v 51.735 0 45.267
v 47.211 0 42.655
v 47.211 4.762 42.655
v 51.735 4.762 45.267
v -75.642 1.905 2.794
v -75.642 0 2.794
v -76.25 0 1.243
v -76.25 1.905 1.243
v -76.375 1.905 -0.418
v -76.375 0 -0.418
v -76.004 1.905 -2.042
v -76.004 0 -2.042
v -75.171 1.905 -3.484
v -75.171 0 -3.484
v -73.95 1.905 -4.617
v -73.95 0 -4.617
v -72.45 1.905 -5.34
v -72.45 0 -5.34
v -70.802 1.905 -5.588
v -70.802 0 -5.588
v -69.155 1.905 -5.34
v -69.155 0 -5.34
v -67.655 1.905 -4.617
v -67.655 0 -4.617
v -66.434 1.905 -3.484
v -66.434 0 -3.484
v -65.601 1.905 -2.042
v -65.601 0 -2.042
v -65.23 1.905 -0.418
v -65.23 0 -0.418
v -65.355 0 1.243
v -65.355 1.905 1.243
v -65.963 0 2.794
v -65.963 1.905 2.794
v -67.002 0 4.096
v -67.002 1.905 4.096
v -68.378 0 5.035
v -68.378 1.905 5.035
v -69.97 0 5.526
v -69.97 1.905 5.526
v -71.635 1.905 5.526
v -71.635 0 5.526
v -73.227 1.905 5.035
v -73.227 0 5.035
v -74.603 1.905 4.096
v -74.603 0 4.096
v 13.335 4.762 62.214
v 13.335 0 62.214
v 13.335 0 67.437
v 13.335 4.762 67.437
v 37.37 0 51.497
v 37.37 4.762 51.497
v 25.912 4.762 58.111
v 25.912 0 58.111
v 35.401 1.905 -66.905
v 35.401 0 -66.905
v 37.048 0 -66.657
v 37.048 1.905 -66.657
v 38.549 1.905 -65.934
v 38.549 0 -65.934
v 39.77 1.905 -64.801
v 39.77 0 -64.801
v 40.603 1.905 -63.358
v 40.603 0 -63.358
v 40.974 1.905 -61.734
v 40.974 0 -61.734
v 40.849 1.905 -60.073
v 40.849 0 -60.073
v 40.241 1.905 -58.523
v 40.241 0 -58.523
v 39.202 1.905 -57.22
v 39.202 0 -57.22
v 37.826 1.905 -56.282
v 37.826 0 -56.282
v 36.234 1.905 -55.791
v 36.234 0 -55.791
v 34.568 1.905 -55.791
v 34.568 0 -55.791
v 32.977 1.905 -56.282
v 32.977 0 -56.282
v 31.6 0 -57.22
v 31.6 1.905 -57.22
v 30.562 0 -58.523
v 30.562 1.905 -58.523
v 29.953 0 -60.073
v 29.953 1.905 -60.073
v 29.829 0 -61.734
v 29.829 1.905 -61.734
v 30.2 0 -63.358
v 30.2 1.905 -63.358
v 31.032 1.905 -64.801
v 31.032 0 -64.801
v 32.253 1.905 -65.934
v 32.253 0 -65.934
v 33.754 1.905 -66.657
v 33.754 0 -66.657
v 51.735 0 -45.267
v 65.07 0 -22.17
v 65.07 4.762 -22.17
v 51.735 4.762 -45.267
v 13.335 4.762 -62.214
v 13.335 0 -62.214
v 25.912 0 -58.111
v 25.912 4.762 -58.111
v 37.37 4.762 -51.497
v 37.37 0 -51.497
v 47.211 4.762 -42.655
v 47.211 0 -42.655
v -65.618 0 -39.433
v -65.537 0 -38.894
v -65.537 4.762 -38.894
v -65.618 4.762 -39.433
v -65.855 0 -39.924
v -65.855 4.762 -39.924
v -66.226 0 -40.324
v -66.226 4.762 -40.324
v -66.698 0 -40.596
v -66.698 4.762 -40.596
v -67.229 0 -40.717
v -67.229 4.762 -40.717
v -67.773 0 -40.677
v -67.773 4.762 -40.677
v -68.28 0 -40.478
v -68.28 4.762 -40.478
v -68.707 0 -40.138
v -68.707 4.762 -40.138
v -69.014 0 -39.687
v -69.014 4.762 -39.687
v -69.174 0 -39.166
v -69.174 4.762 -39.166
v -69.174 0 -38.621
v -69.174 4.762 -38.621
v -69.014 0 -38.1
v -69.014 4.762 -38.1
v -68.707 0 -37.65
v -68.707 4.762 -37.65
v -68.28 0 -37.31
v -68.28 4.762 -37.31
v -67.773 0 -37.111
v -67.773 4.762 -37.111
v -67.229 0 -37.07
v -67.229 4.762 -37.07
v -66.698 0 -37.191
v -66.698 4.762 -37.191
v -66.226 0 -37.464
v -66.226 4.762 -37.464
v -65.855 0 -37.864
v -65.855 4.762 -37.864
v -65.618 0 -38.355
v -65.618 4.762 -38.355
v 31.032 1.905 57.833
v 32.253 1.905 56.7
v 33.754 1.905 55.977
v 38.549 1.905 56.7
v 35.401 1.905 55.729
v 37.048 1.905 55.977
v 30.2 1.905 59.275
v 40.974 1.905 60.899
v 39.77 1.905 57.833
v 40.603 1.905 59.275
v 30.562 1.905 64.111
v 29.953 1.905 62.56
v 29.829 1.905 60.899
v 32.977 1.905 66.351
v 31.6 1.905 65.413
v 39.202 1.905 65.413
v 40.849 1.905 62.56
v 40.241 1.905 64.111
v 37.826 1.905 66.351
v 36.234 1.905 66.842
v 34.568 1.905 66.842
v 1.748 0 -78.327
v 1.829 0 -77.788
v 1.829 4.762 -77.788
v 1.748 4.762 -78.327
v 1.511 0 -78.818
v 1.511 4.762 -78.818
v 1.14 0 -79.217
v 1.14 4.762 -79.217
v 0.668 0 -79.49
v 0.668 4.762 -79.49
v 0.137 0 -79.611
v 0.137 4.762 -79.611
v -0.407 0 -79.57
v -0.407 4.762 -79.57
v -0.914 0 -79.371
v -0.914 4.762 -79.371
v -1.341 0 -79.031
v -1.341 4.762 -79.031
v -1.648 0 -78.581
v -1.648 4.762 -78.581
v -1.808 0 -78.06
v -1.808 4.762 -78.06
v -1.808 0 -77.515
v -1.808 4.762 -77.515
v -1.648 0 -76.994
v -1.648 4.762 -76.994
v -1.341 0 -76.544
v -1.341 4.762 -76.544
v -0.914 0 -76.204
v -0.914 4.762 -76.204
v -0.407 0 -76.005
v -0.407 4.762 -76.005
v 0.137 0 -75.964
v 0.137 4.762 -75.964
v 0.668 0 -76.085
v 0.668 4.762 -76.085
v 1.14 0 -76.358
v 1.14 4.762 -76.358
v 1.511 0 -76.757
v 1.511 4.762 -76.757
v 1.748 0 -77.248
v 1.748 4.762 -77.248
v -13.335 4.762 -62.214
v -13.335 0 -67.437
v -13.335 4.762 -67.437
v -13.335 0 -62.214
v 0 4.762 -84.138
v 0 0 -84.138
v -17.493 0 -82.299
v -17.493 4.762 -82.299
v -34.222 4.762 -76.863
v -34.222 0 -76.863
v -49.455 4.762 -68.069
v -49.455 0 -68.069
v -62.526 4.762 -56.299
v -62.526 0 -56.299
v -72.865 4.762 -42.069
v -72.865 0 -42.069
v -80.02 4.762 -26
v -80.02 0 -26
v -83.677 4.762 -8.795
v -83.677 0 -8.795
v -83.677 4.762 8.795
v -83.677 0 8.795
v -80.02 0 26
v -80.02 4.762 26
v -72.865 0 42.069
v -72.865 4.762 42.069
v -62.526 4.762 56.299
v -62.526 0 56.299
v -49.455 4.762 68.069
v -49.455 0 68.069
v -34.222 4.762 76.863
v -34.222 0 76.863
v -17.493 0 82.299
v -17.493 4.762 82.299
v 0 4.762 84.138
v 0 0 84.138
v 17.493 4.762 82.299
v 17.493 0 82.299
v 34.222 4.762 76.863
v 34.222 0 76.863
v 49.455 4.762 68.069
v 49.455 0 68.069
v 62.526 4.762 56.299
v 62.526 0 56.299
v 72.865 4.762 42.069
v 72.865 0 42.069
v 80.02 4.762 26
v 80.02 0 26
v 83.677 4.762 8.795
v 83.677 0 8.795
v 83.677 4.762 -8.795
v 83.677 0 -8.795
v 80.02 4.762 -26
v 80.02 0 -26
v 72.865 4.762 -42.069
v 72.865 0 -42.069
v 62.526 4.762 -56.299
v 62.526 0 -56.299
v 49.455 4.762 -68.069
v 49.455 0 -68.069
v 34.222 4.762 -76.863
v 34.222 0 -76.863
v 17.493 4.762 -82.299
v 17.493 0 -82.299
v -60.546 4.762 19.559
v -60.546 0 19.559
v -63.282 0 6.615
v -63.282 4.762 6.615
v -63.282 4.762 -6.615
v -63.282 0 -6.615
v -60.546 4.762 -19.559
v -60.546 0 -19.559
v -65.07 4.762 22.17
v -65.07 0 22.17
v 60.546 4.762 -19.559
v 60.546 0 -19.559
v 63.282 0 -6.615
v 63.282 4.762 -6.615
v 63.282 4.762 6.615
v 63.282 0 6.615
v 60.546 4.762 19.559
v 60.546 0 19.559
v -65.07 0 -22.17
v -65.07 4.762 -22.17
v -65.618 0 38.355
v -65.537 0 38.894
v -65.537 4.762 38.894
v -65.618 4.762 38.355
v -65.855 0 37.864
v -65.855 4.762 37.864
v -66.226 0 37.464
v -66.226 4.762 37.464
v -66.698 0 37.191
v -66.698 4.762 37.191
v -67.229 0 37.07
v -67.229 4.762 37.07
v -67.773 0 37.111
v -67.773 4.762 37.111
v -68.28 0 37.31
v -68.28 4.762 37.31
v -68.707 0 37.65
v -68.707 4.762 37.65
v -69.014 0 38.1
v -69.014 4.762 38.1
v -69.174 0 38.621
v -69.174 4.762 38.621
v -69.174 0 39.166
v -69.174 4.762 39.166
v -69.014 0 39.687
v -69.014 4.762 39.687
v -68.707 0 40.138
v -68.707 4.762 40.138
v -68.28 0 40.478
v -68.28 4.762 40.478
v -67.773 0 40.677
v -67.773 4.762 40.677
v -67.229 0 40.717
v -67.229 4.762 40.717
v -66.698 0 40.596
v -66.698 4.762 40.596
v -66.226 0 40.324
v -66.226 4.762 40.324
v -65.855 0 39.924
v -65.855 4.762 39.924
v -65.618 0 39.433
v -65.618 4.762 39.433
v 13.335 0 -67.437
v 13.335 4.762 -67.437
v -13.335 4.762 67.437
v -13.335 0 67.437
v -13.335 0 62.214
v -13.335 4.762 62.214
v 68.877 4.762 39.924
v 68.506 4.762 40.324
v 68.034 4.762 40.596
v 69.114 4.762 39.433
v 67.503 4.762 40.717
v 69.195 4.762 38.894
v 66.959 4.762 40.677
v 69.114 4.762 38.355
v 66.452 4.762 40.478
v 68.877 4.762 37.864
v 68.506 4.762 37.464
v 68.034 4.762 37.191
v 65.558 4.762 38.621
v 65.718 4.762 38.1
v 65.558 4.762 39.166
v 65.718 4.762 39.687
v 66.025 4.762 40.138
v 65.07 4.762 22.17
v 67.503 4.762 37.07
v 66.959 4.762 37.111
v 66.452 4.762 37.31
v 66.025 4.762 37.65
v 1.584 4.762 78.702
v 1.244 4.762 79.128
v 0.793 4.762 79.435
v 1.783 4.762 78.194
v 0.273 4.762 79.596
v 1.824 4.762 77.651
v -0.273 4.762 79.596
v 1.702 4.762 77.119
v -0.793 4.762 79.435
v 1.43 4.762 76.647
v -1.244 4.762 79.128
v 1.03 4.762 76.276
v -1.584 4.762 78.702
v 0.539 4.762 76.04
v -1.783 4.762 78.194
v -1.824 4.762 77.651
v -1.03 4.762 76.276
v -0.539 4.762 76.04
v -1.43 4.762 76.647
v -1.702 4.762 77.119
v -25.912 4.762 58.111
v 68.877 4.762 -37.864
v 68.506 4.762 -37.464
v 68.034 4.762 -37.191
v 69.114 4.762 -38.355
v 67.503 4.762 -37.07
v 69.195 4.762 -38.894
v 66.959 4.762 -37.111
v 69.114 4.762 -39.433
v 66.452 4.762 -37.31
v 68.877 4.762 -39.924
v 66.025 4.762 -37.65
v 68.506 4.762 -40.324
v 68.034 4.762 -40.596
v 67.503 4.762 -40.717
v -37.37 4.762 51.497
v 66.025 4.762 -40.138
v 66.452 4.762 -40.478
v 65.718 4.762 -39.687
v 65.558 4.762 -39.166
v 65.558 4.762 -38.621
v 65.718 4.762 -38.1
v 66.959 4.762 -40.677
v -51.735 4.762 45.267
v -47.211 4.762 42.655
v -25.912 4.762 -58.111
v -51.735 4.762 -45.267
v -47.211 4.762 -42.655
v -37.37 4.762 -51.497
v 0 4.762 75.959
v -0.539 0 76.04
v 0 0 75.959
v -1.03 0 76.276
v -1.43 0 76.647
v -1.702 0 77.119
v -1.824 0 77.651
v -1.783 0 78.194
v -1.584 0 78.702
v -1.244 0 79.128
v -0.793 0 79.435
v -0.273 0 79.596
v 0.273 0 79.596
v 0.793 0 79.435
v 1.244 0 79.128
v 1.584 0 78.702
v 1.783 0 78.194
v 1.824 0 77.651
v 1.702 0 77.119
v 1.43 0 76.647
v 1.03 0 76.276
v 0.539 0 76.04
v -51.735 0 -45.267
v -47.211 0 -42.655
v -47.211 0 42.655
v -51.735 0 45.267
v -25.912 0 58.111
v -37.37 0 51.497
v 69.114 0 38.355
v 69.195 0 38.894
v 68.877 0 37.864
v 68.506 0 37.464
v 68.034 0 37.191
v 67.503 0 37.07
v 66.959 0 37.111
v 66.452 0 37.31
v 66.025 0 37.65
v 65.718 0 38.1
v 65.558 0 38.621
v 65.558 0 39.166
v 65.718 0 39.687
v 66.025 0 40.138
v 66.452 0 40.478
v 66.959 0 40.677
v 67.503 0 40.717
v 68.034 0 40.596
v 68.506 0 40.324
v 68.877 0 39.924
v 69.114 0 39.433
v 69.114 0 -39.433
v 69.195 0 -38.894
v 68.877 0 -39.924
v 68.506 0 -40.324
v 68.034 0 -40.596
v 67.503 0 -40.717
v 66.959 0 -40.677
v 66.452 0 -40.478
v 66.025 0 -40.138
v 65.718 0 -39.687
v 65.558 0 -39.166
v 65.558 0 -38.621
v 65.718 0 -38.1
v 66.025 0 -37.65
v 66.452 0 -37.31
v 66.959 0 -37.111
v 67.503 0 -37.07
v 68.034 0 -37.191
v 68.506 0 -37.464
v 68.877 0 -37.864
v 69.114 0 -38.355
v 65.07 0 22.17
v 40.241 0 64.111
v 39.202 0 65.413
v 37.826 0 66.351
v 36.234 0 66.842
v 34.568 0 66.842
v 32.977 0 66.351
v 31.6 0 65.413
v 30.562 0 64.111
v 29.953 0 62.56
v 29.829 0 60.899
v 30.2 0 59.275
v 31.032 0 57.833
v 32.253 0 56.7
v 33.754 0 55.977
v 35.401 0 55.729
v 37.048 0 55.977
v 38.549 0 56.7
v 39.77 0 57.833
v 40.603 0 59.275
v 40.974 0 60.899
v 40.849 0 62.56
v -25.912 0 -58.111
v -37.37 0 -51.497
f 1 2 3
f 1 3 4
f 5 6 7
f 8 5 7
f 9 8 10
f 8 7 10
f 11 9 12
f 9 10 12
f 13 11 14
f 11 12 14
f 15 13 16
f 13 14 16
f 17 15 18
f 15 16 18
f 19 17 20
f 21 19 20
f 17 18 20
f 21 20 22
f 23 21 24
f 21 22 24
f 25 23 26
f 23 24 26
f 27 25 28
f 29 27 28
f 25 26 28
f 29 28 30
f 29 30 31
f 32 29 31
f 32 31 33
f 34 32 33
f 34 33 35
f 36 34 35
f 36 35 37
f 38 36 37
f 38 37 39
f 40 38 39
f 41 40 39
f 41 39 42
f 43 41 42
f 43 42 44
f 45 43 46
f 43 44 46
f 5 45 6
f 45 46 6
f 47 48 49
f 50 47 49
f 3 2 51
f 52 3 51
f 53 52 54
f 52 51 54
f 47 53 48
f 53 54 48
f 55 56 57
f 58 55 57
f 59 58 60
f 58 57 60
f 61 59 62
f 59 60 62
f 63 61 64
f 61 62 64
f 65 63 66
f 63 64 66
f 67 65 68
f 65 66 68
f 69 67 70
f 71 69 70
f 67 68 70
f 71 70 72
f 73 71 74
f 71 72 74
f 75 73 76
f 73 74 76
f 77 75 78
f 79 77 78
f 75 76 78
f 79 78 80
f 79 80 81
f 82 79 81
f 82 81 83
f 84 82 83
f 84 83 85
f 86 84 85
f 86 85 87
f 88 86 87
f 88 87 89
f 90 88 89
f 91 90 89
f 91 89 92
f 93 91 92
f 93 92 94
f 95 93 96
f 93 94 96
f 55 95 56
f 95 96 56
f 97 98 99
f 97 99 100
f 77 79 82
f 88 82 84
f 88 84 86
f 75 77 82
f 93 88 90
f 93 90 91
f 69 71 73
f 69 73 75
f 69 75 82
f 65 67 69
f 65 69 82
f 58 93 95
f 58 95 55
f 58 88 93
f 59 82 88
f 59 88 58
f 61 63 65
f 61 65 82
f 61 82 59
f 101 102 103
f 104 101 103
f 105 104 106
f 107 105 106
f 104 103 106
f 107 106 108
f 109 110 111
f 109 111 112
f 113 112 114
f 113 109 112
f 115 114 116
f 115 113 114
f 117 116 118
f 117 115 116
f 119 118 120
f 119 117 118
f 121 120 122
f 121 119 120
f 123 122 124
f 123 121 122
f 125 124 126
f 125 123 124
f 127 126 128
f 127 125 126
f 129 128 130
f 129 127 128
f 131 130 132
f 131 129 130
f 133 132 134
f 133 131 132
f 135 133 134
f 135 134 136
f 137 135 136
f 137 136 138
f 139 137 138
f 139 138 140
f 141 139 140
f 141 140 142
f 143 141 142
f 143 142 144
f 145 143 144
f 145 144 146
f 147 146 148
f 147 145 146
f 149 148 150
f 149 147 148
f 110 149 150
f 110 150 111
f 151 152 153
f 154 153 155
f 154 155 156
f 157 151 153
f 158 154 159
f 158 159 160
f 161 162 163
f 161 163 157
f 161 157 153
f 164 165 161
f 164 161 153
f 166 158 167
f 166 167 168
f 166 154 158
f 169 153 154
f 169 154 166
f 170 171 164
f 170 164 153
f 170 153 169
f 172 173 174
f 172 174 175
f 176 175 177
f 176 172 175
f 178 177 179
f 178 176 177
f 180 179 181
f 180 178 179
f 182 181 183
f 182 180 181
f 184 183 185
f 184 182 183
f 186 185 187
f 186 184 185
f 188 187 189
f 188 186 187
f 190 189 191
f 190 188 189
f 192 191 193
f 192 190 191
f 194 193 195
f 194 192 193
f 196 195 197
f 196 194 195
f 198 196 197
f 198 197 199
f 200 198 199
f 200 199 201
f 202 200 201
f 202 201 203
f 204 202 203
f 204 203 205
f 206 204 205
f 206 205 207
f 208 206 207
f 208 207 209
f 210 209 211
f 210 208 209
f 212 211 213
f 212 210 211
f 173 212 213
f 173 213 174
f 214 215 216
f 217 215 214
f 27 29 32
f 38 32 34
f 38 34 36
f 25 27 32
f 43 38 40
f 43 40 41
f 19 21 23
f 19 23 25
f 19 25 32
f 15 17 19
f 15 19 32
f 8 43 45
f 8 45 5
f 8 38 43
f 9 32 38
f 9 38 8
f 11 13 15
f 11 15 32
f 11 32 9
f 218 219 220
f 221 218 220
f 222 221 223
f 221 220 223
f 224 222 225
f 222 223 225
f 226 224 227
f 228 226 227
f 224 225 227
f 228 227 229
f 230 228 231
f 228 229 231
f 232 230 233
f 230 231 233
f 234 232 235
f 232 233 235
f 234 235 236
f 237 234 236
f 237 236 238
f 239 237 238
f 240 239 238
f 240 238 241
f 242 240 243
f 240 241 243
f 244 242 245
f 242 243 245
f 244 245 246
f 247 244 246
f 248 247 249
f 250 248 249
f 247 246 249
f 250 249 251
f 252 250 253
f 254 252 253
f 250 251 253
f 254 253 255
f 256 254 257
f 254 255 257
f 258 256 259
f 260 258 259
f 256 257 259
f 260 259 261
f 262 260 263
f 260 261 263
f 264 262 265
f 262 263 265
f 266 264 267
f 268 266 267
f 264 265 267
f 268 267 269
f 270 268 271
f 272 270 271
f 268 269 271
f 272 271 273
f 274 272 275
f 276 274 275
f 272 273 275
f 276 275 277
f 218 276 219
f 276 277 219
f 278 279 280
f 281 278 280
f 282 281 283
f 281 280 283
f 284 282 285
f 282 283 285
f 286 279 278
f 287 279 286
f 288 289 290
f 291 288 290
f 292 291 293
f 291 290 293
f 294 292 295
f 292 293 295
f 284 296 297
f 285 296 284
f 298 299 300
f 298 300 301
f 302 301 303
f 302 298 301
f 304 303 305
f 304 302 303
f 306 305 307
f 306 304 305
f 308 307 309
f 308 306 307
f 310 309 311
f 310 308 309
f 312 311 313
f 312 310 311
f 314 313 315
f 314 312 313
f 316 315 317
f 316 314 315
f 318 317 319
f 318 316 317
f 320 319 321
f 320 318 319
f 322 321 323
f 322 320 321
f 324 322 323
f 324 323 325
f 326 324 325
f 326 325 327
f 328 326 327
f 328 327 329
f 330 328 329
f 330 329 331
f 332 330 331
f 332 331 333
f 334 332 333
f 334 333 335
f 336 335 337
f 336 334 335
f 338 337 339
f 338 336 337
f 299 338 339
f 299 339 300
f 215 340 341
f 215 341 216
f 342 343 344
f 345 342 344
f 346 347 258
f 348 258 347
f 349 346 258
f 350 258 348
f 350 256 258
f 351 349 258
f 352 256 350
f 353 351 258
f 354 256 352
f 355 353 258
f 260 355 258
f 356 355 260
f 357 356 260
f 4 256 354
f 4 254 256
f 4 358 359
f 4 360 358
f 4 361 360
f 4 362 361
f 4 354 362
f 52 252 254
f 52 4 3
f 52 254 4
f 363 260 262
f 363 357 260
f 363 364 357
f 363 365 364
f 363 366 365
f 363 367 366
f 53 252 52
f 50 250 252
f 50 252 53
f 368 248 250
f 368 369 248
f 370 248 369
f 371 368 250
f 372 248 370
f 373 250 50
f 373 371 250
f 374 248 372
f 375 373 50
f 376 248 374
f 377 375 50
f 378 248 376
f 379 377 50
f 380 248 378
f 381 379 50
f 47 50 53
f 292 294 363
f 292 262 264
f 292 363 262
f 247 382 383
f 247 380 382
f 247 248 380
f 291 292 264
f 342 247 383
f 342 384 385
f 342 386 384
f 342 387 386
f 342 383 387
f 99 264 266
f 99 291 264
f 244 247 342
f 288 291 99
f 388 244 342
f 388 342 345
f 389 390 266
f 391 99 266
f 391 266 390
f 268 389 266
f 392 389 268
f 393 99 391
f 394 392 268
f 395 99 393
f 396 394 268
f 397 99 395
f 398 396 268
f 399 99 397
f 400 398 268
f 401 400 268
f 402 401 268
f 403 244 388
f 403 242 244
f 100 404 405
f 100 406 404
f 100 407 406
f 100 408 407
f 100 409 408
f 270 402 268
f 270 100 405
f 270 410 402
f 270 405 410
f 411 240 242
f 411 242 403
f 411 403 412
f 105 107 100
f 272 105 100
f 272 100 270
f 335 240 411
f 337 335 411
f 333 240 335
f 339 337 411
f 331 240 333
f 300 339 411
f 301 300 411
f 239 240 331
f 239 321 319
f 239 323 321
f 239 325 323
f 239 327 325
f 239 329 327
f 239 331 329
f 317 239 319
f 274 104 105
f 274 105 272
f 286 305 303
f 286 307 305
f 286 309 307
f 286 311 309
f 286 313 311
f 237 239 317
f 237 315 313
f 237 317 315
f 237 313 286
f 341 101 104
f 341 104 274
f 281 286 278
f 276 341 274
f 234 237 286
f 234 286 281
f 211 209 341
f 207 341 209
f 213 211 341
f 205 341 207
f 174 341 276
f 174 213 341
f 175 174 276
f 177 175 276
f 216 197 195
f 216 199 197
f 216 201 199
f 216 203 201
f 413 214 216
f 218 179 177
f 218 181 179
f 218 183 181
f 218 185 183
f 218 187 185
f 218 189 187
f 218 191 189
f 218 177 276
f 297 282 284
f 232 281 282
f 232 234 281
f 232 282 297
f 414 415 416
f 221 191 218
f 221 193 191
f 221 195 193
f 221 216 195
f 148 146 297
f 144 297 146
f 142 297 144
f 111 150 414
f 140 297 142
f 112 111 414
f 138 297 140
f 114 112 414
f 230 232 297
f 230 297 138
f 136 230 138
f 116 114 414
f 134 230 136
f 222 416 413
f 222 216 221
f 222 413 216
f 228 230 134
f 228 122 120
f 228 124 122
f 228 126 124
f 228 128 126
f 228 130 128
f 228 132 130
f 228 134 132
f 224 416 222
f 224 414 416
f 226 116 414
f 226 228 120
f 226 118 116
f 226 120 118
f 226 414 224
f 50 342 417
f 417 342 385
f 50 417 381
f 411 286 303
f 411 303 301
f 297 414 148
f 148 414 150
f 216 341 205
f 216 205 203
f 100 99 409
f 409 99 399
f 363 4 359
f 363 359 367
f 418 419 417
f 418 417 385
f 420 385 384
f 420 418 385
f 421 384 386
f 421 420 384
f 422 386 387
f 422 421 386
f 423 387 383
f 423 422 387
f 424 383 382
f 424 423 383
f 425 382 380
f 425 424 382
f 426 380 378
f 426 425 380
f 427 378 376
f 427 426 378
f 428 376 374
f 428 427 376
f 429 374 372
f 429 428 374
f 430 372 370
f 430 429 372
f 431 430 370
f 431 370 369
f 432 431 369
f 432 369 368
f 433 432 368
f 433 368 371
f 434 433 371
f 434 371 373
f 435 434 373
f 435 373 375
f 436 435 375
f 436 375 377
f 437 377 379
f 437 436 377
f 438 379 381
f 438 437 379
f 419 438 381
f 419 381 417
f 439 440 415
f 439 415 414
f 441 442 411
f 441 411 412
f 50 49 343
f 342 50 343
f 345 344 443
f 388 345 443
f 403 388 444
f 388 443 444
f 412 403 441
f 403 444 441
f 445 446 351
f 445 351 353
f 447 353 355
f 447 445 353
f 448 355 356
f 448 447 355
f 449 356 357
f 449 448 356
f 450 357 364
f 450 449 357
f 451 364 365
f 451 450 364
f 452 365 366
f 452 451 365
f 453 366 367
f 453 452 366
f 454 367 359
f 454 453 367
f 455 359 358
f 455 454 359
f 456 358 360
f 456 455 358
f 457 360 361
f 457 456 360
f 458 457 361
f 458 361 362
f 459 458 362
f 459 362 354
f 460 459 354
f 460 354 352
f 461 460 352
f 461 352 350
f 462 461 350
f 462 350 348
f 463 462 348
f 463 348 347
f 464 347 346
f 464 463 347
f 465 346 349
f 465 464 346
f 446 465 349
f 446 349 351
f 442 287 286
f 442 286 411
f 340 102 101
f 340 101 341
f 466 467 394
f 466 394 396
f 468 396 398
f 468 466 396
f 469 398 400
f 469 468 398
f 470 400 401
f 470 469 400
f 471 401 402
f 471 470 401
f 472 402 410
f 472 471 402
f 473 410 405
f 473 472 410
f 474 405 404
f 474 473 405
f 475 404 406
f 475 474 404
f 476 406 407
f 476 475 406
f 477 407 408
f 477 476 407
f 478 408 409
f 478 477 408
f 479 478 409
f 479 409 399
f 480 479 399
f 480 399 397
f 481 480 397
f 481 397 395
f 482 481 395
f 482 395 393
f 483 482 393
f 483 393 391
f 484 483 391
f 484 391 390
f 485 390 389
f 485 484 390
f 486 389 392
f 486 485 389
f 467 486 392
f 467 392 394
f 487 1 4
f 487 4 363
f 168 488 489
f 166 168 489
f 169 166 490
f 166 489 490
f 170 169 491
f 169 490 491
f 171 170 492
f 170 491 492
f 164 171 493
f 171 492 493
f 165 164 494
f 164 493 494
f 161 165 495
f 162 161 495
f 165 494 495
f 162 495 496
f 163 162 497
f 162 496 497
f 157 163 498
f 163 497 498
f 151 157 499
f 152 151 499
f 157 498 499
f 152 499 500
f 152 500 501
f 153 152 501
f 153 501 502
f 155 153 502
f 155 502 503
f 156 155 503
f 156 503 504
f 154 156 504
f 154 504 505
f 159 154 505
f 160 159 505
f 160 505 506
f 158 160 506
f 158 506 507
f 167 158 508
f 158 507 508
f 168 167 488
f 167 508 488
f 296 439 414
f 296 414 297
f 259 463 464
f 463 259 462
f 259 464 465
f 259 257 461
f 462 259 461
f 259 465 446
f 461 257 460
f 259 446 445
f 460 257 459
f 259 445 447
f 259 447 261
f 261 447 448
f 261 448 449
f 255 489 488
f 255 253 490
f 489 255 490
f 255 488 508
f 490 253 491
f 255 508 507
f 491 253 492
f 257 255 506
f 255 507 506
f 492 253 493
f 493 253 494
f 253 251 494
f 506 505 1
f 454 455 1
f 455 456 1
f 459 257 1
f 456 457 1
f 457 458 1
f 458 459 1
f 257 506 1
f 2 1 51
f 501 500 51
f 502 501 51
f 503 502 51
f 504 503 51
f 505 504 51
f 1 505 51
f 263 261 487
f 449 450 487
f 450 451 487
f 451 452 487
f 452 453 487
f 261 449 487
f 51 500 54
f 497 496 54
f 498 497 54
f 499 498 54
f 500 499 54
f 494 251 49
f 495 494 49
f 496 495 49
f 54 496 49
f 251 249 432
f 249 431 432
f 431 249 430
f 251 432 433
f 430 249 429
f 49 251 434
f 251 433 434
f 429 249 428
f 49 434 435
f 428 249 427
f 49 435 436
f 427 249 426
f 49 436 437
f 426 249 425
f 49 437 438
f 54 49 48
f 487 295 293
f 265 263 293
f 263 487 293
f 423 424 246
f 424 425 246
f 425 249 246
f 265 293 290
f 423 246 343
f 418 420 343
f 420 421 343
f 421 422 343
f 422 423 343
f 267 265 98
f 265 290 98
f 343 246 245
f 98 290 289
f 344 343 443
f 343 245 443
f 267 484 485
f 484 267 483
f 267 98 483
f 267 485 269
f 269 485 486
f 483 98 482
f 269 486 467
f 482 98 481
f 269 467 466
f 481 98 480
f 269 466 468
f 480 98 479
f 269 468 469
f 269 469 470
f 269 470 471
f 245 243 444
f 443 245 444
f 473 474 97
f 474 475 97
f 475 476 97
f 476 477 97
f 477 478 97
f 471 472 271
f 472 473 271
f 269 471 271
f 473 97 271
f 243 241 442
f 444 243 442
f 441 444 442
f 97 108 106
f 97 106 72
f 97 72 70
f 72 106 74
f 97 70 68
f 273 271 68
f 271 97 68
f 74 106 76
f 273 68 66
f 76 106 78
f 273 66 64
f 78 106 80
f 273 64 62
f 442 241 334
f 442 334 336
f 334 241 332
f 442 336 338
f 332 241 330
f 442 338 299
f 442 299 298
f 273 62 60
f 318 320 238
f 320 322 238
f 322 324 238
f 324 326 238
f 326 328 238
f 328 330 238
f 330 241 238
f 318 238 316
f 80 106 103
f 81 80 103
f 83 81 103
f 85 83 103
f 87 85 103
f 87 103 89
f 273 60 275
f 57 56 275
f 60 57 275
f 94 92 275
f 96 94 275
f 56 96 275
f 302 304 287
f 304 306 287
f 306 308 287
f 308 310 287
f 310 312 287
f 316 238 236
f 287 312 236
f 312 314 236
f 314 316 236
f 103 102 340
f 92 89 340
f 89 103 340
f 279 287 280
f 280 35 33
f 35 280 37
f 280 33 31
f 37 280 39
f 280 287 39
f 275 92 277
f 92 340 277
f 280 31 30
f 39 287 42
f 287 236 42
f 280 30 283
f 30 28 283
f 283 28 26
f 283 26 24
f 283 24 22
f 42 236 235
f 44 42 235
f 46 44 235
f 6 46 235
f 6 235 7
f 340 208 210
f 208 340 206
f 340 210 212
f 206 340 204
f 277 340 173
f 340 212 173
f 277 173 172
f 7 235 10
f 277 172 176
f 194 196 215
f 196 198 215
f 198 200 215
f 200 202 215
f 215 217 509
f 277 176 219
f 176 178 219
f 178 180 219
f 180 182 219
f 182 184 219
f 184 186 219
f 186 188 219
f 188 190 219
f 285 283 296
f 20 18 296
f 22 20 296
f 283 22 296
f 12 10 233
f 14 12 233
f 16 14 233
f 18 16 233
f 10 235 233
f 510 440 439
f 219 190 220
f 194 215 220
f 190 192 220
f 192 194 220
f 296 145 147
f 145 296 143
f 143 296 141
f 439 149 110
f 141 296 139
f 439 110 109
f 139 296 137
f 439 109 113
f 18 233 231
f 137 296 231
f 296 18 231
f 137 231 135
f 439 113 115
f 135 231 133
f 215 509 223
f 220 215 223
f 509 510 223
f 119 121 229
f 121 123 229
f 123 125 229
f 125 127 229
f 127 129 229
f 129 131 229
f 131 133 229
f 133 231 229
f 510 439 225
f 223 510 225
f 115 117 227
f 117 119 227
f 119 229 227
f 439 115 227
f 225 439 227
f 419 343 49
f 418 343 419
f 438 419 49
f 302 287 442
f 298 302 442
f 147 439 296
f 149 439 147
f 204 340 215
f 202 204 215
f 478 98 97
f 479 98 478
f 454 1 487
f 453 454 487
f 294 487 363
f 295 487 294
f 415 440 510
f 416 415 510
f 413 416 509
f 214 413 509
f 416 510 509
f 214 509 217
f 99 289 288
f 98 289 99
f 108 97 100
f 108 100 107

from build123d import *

# Parameters (mm, degrees)
SKETCH1_R             = 84.1375
SKETCH1_R_2           = 1.8288
BOSS_EXTRUDE1_DEPTH   = 4.7625
CIRPATTERN1_OUTLINE_R = 1.8288
CIRPATTERN1_DEPTH     = 4.7625
SKETCH4_R             = 5.588
CUT_EXTRUDE1_DEPTH    = 1.905
CIRPATTERN2_COUNT     = 3


# Read off the part's stored shape, not the designer's step: CirPattern1
with BuildPart() as part:
    # Sketch1 → Boss-Extrude1 (new body)
    with BuildSketch(Plane(origin=(0, 0, 0), x_dir=(1, 0, 0), z_dir=(0, 1, 0))):
        with Locations(Location((0, 0, 0), (0, 0, 90))):
            Circle(SKETCH1_R)
        with BuildLine():
            ThreePointArc((-13.335, -62.213928537), (0, 63.627), (13.335, -62.213928537))
            Line((13.335, -62.213928537), (13.335, -67.437))
            Line((13.335, -67.437), (-13.335, -67.437))
            Line((-13.335, -67.437), (-13.335, -62.213928537))
        make_face(mode=Mode.SUBTRACT)
        with Locations(Location((0, -77.7875, 0), (0, 0, 90))):
            Circle(SKETCH1_R_2, mode=Mode.SUBTRACT)
    extrude(amount=BOSS_EXTRUDE1_DEPTH)

    # CirPattern1 outline → CirPattern1 (cut)
    with BuildSketch(Plane(origin=(0, 0, 0), x_dir=(1, 0, 0), z_dir=(0, 1, 0))):
        with BuildLine():
            Line((65.069655155, -22.170051241), (60.546342582, -19.558515509))
            ThreePointArc((60.546342582, -19.558515509), (55.102598367, -31.8135), (47.211342582, -42.655413028))
            Line((47.211342582, -42.655413028), (51.734655155, -45.266948759))
            Line((51.734655155, -45.266948759), (65.069655155, -22.170051241))
        make_face()
        with BuildLine():
            Line((51.734655155, 45.266948759), (47.211342582, 42.655413028))
            ThreePointArc((47.211342582, 42.655413028), (55.102598367, 31.8135), (60.546342582, 19.558515509))
            Line((60.546342582, 19.558515509), (65.069655155, 22.170051241))
            Line((65.069655155, 22.170051241), (51.734655155, 45.266948759))
        make_face()
        with BuildLine():
            Line((-13.335, 67.437), (-13.335, 62.213928537))
            ThreePointArc((-13.335, 62.213928537), (0, 63.627), (13.335, 62.213928537))
            Line((13.335, 62.213928537), (13.335, 67.437))
            Line((13.335, 67.437), (-13.335, 67.437))
        make_face()
        with BuildLine():
            Line((-65.069655155, 22.170051241), (-60.546342582, 19.558515509))
            ThreePointArc((-60.546342582, 19.558515509), (-55.102598367, 31.8135), (-47.211342582, 42.655413028))
            Line((-47.211342582, 42.655413028), (-51.734655155, 45.266948759))
            Line((-51.734655155, 45.266948759), (-65.069655155, 22.170051241))
        make_face()
        with BuildLine():
            Line((-65.069655155, -22.170051241), (-51.734655155, -45.266948759))
            Line((-51.734655155, -45.266948759), (-47.211342582, -42.655413028))
            ThreePointArc((-47.211342582, -42.655413028), (-55.102598367, -31.8135), (-60.546342582, -19.558515509))
            Line((-60.546342582, -19.558515509), (-65.069655155, -22.170051241))
        make_face()
        with Locations((-67.365951097, -38.89375)):
            Circle(CIRPATTERN1_OUTLINE_R)
        with Locations((-67.365951097, 38.89375)):
            Circle(CIRPATTERN1_OUTLINE_R)
        with Locations((0, 77.7875)):
            Circle(CIRPATTERN1_OUTLINE_R)
        with Locations((67.365951097, 38.89375)):
            Circle(CIRPATTERN1_OUTLINE_R)
        with Locations((67.365951097, -38.89375)):
            Circle(CIRPATTERN1_OUTLINE_R)
    extrude(amount=CIRPATTERN1_DEPTH, mode=Mode.SUBTRACT)

    # Sketch4 → Cut-Extrude1 (cut)
    with BuildSketch(Plane.XZ):
        with Locations(Location((35.40125, -61.316763651, 0), (0, 0, 270))):
            Circle(SKETCH4_R)
    cut_extrude1 = extrude(amount=-CUT_EXTRUDE1_DEPTH, mode=Mode.SUBTRACT)

    # CirPattern2: Cut-Extrude1 ×3 about axis
    cirpattern2_axis = Axis((0, 0, 0), (0, 1, 0))
    for i in range(1, CIRPATTERN2_COUNT):
        add(cut_extrude1.rotate(cirpattern2_axis, i * 360 / CIRPATTERN2_COUNT), mode=Mode.SUBTRACT)


solid = part.part
